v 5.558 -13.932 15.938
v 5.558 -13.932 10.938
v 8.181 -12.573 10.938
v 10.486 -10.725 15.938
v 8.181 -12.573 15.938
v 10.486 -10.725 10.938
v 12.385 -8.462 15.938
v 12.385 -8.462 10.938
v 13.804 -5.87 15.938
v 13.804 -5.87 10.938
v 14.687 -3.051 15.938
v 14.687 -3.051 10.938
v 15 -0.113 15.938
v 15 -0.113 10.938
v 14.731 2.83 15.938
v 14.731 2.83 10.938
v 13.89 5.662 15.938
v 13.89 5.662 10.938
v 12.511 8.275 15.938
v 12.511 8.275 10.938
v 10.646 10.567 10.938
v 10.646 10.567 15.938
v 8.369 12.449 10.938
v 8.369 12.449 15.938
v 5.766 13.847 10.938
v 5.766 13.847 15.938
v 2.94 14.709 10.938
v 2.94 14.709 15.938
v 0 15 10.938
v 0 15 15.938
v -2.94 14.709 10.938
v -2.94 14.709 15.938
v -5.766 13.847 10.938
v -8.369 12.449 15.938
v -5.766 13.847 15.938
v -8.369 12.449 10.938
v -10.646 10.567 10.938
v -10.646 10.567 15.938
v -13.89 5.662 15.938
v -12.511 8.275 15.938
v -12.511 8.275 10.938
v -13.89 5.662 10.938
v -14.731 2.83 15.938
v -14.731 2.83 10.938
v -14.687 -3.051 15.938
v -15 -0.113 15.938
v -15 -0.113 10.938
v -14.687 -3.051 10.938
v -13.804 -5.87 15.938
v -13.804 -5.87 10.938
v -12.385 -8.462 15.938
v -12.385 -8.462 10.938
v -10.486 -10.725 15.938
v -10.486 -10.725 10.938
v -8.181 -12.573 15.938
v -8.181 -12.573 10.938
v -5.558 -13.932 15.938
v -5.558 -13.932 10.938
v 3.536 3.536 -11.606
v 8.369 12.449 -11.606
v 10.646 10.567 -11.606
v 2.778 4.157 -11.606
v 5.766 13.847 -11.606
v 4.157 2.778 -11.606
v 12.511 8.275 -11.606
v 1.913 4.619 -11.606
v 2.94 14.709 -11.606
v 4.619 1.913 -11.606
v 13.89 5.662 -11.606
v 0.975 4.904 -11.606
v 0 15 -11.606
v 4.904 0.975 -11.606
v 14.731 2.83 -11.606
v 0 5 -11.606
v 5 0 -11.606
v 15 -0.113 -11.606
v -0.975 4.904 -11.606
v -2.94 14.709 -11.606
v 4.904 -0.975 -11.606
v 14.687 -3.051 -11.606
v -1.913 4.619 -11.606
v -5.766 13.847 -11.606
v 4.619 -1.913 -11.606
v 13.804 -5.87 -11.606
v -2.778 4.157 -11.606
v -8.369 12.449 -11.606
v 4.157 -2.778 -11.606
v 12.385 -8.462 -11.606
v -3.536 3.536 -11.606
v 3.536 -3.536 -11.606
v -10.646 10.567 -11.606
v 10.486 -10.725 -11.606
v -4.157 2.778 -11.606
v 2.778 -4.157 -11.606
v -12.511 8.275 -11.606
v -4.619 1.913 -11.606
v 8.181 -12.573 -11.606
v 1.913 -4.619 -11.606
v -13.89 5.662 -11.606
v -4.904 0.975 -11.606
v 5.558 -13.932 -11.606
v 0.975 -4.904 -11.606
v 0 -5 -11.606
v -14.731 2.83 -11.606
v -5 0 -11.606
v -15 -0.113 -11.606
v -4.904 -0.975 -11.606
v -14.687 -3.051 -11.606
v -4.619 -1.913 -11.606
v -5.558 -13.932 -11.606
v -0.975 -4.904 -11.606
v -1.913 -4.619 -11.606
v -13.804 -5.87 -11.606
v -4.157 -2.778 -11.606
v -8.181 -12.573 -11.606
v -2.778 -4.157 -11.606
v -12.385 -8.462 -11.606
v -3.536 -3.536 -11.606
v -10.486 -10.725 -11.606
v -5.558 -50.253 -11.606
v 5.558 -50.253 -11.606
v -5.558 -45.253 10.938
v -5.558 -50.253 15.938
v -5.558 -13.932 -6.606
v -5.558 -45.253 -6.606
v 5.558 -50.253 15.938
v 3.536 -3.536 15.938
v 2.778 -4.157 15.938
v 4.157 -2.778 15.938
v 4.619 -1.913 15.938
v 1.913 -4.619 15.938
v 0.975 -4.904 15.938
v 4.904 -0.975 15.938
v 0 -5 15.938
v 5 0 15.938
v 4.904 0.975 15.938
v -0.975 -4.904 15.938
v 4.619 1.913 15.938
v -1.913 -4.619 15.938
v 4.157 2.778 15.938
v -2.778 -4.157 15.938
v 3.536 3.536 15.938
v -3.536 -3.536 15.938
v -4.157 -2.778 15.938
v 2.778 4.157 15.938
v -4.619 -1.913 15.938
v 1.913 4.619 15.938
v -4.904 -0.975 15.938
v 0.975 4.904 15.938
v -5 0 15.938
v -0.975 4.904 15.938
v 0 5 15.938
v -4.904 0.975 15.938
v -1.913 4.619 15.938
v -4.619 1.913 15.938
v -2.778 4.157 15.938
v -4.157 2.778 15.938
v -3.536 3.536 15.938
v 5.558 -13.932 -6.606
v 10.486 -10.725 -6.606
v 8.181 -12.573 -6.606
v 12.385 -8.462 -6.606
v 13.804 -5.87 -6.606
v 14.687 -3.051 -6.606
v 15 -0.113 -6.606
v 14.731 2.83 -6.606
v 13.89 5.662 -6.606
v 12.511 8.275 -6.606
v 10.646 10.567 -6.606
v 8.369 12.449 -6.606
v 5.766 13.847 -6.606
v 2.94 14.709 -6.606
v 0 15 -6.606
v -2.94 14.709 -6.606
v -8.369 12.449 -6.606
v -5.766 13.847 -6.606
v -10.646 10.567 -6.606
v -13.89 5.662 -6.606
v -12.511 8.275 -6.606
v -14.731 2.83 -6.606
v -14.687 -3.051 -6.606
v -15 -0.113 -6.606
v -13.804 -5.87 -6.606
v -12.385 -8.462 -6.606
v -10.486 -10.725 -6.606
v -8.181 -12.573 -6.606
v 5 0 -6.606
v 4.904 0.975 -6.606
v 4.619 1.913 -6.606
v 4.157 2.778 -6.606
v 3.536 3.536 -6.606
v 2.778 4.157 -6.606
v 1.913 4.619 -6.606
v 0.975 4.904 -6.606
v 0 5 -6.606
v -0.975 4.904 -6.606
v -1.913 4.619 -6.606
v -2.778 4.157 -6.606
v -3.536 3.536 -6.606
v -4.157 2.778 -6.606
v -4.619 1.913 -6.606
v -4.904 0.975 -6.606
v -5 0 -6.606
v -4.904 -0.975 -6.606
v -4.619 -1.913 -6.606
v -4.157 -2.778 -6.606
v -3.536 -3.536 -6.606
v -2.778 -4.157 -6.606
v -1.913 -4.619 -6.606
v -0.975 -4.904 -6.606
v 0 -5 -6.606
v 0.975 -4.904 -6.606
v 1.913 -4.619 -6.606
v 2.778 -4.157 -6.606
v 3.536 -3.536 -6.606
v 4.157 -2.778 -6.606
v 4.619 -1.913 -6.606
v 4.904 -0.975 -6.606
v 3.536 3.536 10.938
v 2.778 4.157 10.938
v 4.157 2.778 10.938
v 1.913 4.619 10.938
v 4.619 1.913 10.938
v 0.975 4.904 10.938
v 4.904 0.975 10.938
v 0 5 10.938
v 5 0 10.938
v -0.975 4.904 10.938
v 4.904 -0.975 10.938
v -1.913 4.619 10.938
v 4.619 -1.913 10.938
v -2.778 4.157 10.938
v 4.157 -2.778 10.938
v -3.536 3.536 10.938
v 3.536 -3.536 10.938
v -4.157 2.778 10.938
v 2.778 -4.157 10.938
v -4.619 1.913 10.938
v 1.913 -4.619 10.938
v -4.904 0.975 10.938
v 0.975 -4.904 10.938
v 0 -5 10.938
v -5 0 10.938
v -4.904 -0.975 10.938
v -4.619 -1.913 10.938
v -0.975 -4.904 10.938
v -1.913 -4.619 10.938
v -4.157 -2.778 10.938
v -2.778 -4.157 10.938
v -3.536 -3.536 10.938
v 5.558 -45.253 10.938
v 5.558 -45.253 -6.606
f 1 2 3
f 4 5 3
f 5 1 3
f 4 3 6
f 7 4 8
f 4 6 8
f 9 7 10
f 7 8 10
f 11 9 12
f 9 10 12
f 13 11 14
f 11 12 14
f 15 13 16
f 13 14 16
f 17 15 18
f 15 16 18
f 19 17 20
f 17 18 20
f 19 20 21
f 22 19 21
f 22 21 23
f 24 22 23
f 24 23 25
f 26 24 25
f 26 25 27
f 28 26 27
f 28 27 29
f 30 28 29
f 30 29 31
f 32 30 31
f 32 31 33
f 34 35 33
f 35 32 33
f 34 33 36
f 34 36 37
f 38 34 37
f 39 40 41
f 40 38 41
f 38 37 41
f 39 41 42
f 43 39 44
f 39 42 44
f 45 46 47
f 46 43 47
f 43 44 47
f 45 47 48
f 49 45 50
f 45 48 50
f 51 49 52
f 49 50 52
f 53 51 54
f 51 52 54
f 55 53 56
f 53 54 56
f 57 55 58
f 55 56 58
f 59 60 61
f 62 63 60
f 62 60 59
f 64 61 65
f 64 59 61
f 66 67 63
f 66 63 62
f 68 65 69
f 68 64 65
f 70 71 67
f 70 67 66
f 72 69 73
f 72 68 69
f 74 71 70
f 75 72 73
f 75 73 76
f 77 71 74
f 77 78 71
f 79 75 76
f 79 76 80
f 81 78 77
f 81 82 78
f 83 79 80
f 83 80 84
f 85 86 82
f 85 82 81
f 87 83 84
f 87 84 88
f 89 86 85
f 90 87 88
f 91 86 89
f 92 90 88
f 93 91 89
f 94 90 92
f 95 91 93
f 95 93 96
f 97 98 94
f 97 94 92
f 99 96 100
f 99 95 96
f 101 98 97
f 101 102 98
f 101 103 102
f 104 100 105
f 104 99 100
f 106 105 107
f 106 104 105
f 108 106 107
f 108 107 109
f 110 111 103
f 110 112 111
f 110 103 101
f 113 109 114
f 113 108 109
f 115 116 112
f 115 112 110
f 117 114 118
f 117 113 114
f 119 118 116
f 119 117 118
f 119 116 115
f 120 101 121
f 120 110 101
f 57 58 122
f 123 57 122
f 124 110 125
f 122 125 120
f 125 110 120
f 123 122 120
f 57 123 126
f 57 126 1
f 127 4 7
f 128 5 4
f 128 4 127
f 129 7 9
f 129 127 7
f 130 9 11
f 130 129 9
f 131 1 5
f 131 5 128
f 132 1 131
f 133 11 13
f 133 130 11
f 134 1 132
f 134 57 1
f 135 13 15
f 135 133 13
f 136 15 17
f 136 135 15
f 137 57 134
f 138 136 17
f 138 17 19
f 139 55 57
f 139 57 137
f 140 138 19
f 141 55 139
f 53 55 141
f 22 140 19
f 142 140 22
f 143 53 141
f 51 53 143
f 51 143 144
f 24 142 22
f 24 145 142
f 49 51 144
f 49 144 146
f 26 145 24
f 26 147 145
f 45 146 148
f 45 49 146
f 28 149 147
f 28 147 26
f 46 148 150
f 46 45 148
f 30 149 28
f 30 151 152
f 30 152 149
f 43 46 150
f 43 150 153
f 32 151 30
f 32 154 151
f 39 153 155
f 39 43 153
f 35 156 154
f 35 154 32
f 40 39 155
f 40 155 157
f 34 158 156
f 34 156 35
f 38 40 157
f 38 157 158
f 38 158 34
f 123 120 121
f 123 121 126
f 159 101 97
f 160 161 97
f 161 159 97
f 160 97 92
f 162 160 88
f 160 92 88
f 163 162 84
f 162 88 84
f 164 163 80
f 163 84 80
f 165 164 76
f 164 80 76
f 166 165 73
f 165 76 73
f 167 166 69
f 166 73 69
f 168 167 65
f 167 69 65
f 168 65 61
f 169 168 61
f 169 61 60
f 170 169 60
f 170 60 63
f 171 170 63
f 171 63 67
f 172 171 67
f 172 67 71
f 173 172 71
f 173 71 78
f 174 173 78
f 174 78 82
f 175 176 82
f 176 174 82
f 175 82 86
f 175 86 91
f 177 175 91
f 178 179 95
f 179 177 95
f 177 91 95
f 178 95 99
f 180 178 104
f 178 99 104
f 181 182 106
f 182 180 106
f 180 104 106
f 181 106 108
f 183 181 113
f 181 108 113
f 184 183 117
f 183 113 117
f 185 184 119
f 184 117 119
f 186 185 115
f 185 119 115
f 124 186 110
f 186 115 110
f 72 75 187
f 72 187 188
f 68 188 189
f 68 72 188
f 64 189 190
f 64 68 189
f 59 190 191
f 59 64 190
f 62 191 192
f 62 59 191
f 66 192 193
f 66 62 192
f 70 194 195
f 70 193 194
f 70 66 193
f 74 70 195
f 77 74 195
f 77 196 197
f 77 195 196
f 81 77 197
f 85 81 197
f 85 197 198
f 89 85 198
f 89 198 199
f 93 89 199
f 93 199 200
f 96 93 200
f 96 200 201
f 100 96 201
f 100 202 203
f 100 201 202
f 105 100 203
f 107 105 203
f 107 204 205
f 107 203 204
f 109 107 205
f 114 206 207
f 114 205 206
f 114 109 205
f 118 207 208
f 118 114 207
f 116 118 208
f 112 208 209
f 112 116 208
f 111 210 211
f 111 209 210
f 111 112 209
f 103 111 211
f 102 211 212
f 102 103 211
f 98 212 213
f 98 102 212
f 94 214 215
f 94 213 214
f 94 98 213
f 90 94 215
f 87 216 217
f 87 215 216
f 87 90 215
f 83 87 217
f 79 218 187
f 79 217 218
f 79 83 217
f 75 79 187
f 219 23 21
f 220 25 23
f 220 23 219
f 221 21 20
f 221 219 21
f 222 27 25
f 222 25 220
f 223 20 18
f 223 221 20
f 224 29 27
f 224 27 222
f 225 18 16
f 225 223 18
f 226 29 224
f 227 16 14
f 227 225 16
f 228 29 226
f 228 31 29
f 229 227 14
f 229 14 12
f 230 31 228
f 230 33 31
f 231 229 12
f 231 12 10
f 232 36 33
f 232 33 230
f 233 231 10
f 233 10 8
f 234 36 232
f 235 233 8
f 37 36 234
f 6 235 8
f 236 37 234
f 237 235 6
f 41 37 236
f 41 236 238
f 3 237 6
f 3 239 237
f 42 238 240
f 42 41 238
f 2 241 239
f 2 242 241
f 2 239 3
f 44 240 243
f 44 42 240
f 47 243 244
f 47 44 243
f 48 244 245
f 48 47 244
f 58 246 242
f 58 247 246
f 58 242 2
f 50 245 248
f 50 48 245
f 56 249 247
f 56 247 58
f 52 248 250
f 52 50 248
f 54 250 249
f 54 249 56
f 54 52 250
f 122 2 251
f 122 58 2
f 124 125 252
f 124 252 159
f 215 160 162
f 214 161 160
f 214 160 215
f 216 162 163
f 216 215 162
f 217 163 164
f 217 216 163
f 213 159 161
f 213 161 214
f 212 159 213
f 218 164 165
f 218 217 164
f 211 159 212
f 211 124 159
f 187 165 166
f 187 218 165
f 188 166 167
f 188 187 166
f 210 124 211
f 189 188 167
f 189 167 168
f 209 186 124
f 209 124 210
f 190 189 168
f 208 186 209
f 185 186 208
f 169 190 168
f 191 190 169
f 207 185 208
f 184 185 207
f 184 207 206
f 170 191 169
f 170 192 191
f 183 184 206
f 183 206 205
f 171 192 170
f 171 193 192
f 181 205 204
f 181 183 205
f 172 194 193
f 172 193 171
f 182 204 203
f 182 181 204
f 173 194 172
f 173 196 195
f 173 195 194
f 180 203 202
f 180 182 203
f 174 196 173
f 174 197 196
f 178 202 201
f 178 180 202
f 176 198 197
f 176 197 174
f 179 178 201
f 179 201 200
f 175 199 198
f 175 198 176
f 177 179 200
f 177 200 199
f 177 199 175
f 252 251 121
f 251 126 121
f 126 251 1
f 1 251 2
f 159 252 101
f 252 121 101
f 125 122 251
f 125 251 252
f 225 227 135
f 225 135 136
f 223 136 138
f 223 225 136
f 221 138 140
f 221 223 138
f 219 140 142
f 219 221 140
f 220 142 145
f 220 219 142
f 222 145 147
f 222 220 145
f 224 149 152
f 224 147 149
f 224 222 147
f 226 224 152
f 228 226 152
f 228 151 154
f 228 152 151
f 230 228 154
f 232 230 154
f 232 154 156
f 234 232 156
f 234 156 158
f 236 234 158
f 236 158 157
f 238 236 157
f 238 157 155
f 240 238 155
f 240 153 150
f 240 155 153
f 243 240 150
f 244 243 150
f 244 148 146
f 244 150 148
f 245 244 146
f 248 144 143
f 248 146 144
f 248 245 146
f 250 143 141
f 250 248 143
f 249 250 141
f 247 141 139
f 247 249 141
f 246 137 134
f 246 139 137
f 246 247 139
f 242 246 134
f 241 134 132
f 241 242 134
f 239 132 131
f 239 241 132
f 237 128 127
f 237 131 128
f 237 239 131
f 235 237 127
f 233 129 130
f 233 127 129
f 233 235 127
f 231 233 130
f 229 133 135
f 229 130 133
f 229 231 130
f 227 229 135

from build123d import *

# Parameters (mm, degrees)
EXTRUDE_5_DEPTH      = 30
EXTRUDE_5_DEPTH_BACK = 30
F_1_FR_R             = 5
EXTRUDE_6_DEPTH      = 20
EXTRUDE_6_DEPTH_BACK = 20


with BuildPart() as part:
    # Эскиз1_fr → Бобышка-Вытянуть5 (new, two sides: drawn at the far end of the back side and taken through both)
    with BuildSketch(Plane.XY.offset(-EXTRUDE_5_DEPTH_BACK)):
        with BuildLine():
            Line((-5.557606452, -13.932444528), (-5.557606452, -62.642280008))
            Line((-5.557606452, -62.642280008), (5.557606452, -62.642280008))
            Line((5.557606452, -62.642280008), (5.557606452, -13.932444528))
            ThreePointArc((5.557606452, -13.932444528), (0, 15), (-5.557606452, -13.932444528))
        make_face()
        Circle(F_1_FR_R, mode=Mode.SUBTRACT)
    extrude(amount=EXTRUDE_5_DEPTH + EXTRUDE_5_DEPTH_BACK)


with BuildPart() as body_2:
    # Эскиз3 → Бобышка-Вытянуть6 (new, two sides: drawn at the far end of the back side and taken through both)
    with BuildSketch(Plane(origin=(0, 0, 0), x_dir=(0, 0, -1), z_dir=(1, 0, 0)).offset(-EXTRUDE_6_DEPTH_BACK)):
        Polygon((-58.394498043, -50.25314581), (-85.938130262, -50.25314581), (-85.938130262, 27.580465306), (-80.938130262, 27.580465306), (-80.938130262, -45.25314581), (-63.394498043, -45.25314581), (-63.394498043, 27.580465306), (-58.394498043, 27.580465306), align=None)
    extrude(amount=EXTRUDE_6_DEPTH + EXTRUDE_6_DEPTH_BACK)


with BuildPart() as body_2_1:
    # Move Body 1: moved
    add(body_2.part.moved(Location((0, 0, -70))))


with BuildPart() as part_1:
    add(part.part)

    # Combine 1: intersect body 2
    add(body_2_1.part, mode=Mode.INTERSECT)


solid = part_1.part
